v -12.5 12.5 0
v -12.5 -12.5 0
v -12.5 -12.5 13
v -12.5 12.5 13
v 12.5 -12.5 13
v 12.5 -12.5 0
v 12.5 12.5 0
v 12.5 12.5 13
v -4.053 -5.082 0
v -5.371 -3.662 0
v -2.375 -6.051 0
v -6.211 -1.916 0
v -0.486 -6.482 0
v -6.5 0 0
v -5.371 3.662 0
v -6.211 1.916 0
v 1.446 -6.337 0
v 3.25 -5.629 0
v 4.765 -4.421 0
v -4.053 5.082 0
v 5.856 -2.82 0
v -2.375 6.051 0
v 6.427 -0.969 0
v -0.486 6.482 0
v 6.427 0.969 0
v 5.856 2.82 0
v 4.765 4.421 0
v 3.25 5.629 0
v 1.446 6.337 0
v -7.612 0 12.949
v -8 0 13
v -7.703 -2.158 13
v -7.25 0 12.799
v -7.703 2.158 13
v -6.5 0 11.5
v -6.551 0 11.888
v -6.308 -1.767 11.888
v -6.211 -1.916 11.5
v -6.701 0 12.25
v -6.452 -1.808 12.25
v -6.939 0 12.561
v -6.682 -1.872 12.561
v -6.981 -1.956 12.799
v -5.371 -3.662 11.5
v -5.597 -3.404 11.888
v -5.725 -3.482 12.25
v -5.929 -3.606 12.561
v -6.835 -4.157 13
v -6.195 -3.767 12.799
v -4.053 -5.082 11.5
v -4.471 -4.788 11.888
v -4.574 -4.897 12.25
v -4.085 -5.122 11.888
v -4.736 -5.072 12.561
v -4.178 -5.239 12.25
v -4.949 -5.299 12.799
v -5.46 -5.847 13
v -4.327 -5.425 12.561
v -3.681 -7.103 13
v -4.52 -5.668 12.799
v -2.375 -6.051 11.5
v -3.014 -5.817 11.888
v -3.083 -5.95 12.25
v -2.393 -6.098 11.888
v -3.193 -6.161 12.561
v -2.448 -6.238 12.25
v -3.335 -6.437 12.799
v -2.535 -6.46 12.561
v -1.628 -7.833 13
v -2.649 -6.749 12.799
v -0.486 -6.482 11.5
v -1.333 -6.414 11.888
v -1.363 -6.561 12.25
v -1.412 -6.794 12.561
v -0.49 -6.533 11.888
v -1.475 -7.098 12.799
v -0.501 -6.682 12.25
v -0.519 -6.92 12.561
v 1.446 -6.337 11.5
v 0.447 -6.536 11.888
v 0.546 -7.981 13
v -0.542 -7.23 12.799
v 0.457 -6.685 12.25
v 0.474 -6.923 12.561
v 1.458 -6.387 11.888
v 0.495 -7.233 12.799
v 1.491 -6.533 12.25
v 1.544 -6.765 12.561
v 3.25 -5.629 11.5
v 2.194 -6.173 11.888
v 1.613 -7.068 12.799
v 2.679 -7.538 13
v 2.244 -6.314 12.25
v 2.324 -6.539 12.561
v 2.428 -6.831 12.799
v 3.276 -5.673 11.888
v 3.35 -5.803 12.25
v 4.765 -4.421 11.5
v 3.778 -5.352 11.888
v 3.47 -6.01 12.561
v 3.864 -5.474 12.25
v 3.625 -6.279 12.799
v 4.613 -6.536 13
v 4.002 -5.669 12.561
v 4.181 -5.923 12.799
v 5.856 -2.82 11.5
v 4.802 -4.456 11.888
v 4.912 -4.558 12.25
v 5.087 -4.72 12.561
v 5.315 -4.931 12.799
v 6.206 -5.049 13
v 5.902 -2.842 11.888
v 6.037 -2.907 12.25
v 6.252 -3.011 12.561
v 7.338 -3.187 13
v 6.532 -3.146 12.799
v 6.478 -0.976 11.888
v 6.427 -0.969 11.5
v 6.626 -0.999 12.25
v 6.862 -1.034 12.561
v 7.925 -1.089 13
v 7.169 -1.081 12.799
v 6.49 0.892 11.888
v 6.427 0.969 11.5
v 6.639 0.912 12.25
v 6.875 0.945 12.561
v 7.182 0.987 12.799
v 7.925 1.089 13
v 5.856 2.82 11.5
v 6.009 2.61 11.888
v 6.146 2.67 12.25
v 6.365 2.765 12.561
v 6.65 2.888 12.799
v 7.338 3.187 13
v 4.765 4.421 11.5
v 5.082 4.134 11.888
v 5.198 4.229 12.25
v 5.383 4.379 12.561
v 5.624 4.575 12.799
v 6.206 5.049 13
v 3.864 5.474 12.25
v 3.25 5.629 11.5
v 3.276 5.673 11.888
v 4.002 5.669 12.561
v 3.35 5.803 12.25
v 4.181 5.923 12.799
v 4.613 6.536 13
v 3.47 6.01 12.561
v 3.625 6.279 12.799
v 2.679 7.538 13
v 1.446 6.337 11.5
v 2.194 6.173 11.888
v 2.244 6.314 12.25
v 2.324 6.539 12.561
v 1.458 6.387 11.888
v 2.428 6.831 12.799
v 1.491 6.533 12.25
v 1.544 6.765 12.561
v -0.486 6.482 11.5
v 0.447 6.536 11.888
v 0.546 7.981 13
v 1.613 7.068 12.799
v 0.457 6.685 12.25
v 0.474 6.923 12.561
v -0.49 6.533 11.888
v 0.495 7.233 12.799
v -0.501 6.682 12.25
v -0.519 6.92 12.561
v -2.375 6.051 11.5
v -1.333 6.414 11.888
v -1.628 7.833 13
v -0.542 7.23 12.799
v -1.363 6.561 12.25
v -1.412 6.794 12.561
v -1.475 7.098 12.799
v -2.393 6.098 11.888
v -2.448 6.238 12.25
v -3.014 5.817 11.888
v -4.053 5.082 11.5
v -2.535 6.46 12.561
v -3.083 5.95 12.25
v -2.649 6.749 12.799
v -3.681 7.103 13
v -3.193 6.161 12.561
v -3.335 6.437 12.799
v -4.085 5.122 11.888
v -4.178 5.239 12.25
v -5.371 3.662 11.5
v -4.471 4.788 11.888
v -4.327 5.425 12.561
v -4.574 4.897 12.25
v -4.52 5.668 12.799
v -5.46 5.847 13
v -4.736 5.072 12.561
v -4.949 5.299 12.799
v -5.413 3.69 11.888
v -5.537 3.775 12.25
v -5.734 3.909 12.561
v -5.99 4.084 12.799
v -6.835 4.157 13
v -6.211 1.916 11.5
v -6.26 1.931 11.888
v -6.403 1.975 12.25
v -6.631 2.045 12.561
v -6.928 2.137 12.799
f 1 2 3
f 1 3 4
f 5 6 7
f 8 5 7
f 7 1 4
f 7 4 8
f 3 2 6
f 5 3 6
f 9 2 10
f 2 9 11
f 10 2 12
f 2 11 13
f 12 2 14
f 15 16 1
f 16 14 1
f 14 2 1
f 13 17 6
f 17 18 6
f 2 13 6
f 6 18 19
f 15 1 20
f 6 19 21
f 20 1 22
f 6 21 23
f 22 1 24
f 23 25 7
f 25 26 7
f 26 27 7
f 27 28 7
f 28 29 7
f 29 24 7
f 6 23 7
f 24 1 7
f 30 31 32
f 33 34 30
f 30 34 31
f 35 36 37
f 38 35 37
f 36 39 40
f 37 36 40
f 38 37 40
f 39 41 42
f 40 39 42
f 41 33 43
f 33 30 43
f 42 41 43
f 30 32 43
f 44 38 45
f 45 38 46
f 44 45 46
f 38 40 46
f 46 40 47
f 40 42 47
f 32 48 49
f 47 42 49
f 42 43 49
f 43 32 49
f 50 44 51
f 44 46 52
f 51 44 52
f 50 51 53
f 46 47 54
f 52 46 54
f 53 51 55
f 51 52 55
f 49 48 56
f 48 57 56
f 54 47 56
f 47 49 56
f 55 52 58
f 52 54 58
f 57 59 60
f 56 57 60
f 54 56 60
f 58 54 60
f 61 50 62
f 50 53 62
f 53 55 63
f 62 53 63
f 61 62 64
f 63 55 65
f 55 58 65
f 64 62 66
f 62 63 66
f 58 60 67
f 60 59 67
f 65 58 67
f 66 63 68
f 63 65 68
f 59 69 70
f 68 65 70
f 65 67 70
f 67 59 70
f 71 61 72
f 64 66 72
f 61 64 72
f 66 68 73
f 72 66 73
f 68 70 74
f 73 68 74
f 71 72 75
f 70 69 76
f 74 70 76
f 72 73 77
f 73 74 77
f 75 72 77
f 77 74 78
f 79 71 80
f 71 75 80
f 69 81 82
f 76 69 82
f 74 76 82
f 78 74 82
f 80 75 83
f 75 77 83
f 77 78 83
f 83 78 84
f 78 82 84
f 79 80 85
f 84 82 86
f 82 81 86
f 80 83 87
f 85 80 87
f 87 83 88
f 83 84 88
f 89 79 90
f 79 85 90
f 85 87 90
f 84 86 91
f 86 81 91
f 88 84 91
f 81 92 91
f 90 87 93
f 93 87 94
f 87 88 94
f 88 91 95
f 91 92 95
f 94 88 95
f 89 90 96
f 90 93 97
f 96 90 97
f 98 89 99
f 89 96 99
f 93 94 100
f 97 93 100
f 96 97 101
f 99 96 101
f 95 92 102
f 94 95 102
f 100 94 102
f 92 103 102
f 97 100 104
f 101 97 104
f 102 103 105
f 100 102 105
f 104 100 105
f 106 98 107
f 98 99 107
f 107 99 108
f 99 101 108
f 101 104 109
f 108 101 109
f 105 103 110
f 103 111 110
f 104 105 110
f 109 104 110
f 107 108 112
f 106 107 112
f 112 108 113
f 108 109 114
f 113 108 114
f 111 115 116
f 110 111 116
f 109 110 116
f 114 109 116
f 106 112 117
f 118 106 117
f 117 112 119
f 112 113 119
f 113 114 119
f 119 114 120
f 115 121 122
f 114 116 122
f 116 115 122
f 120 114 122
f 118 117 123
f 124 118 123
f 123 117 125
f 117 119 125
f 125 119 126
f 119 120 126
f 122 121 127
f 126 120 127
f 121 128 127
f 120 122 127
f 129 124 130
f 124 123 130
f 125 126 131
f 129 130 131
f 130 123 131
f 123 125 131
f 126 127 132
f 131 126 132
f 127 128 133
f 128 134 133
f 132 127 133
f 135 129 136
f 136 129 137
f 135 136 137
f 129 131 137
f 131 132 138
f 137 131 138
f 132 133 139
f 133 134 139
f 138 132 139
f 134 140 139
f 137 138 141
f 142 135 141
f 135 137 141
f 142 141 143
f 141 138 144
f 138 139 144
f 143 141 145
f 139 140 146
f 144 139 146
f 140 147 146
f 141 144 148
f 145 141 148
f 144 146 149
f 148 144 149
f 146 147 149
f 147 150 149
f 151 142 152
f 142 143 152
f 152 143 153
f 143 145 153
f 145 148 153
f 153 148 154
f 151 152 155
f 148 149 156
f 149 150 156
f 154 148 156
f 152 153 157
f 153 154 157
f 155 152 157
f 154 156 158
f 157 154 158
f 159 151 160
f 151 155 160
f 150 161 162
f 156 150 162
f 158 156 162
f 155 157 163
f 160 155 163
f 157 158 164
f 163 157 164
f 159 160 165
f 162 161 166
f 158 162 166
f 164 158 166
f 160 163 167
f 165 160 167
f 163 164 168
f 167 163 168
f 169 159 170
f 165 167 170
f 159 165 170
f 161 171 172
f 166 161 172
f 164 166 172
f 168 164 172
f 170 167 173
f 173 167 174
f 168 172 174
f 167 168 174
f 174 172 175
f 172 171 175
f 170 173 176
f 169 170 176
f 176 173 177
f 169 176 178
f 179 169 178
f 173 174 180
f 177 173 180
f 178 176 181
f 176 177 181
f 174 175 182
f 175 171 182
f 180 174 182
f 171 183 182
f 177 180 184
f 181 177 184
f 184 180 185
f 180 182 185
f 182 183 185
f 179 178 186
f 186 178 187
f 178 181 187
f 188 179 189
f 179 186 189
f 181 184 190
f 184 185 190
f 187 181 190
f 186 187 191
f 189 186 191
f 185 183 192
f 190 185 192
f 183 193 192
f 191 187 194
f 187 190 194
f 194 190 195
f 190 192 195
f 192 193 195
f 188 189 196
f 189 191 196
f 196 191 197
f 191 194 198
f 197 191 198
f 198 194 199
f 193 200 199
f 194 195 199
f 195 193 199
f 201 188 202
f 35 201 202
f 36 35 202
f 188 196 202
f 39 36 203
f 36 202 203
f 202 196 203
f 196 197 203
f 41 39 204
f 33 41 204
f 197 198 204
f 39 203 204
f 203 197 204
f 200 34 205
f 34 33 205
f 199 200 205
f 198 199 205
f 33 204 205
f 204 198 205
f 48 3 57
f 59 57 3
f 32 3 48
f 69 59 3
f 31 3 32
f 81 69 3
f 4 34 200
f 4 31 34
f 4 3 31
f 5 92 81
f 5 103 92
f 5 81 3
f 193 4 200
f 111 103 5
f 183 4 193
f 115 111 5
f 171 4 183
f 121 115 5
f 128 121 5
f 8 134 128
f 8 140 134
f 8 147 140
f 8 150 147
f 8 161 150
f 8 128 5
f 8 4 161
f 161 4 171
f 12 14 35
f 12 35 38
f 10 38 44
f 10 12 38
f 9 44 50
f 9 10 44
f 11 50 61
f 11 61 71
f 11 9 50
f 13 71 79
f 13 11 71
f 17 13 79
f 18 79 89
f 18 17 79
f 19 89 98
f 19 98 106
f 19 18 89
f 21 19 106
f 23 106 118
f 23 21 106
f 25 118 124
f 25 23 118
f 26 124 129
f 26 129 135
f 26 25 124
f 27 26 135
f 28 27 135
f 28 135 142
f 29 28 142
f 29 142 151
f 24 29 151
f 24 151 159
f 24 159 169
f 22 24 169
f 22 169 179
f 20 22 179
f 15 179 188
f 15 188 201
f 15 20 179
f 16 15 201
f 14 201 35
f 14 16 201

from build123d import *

# Parameters (mm, degrees)
SKETCH1_W           = 25
SKETCH1_H           = 25
SKETCH1_R           = 6.5
BOSS_EXTRUDE1_DEPTH = 13
FILLET1_R           = 1.5


with BuildPart() as part:
    # Sketch1 → Boss-Extrude1 (new body)
    with BuildSketch(Plane.XY):
        Rectangle(SKETCH1_W, SKETCH1_H)
        with Locations(Location((0, 0, 0), (0, 0, 180))):
            Circle(SKETCH1_R, mode=Mode.SUBTRACT)
    extrude(amount=BOSS_EXTRUDE1_DEPTH)

    # Fillet1
    fillet1_edges = [part.edges().sort_by_distance(p)[0] for p in [
        (6.5, 0, 13),
    ]]
    fillet(fillet1_edges, radius=FILLET1_R)


solid = part.part
